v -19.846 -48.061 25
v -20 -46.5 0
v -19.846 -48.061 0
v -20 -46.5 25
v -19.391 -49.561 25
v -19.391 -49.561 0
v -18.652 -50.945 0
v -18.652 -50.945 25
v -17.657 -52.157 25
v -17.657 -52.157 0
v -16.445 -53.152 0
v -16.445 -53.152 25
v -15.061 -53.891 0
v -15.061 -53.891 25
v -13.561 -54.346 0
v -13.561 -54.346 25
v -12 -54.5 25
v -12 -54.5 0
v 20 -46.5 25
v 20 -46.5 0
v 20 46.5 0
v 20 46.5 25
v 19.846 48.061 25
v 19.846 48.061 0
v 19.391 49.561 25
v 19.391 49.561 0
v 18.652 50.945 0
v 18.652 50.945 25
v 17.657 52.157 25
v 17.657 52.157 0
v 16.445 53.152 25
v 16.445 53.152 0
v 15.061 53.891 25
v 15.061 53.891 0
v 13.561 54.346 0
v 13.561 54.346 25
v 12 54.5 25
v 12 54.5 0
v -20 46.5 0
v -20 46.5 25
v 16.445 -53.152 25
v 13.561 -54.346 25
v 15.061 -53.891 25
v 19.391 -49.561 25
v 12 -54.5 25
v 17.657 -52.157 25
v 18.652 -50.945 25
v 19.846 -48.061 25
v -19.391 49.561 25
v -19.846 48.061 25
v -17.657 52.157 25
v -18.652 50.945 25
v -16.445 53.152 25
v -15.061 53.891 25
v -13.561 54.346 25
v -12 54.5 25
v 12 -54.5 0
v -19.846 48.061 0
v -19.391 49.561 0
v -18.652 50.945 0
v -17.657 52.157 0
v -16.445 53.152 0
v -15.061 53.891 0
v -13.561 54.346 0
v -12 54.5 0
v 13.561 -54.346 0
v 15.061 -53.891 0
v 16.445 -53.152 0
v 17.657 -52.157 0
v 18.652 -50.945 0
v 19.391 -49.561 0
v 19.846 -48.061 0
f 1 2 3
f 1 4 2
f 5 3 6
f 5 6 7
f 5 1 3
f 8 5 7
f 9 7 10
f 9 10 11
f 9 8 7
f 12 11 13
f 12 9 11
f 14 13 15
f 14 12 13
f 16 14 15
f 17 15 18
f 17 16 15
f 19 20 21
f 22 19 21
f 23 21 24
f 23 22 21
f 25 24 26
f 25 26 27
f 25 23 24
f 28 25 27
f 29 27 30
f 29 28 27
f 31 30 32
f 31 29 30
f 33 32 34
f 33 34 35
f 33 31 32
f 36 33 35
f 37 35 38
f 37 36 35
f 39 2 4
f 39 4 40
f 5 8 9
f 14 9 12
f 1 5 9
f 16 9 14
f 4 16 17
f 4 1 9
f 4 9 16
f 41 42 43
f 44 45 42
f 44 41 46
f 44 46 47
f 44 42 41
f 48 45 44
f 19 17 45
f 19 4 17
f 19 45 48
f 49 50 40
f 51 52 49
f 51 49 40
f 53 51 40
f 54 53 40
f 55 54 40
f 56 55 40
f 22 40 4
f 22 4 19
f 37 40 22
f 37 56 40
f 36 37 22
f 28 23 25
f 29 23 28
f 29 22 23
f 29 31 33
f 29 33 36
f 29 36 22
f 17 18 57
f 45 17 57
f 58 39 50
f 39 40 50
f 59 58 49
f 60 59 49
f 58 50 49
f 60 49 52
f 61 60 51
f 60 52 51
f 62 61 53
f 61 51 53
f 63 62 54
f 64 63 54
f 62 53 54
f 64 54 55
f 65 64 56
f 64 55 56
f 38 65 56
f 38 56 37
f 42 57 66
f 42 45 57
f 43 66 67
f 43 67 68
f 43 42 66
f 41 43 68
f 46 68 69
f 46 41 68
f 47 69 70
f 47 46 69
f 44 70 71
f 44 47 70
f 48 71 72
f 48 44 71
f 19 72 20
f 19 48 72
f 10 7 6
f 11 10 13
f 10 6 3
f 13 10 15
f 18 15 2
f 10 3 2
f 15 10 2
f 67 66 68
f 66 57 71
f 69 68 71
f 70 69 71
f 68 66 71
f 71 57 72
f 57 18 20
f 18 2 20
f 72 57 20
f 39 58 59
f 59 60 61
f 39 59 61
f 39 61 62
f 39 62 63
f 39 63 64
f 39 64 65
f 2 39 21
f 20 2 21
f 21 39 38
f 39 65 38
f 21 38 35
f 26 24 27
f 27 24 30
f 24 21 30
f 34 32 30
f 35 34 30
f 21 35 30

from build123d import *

# Parameters (mm, degrees)
SKETCH1_W           = 40
SKETCH1_H           = 109
BOSS_EXTRUDE1_DEPTH = 25
FILLET1_R           = 8


with BuildPart() as part:
    # Sketch1 → Boss-Extrude1 (new body)
    with BuildSketch(Plane.XY):
        Rectangle(SKETCH1_W, SKETCH1_H)
    extrude(amount=BOSS_EXTRUDE1_DEPTH)

    # Fillet1
    fillet1_edges = [part.edges().sort_by_distance(p)[0] for p in [
        (20, -54.5, 12.5),
        (-20, -54.5, 12.5),
        (-20, 54.5, 12.5),
        (20, 54.5, 12.5),
    ]]
    fillet(fillet1_edges, radius=FILLET1_R)


solid = part.part
